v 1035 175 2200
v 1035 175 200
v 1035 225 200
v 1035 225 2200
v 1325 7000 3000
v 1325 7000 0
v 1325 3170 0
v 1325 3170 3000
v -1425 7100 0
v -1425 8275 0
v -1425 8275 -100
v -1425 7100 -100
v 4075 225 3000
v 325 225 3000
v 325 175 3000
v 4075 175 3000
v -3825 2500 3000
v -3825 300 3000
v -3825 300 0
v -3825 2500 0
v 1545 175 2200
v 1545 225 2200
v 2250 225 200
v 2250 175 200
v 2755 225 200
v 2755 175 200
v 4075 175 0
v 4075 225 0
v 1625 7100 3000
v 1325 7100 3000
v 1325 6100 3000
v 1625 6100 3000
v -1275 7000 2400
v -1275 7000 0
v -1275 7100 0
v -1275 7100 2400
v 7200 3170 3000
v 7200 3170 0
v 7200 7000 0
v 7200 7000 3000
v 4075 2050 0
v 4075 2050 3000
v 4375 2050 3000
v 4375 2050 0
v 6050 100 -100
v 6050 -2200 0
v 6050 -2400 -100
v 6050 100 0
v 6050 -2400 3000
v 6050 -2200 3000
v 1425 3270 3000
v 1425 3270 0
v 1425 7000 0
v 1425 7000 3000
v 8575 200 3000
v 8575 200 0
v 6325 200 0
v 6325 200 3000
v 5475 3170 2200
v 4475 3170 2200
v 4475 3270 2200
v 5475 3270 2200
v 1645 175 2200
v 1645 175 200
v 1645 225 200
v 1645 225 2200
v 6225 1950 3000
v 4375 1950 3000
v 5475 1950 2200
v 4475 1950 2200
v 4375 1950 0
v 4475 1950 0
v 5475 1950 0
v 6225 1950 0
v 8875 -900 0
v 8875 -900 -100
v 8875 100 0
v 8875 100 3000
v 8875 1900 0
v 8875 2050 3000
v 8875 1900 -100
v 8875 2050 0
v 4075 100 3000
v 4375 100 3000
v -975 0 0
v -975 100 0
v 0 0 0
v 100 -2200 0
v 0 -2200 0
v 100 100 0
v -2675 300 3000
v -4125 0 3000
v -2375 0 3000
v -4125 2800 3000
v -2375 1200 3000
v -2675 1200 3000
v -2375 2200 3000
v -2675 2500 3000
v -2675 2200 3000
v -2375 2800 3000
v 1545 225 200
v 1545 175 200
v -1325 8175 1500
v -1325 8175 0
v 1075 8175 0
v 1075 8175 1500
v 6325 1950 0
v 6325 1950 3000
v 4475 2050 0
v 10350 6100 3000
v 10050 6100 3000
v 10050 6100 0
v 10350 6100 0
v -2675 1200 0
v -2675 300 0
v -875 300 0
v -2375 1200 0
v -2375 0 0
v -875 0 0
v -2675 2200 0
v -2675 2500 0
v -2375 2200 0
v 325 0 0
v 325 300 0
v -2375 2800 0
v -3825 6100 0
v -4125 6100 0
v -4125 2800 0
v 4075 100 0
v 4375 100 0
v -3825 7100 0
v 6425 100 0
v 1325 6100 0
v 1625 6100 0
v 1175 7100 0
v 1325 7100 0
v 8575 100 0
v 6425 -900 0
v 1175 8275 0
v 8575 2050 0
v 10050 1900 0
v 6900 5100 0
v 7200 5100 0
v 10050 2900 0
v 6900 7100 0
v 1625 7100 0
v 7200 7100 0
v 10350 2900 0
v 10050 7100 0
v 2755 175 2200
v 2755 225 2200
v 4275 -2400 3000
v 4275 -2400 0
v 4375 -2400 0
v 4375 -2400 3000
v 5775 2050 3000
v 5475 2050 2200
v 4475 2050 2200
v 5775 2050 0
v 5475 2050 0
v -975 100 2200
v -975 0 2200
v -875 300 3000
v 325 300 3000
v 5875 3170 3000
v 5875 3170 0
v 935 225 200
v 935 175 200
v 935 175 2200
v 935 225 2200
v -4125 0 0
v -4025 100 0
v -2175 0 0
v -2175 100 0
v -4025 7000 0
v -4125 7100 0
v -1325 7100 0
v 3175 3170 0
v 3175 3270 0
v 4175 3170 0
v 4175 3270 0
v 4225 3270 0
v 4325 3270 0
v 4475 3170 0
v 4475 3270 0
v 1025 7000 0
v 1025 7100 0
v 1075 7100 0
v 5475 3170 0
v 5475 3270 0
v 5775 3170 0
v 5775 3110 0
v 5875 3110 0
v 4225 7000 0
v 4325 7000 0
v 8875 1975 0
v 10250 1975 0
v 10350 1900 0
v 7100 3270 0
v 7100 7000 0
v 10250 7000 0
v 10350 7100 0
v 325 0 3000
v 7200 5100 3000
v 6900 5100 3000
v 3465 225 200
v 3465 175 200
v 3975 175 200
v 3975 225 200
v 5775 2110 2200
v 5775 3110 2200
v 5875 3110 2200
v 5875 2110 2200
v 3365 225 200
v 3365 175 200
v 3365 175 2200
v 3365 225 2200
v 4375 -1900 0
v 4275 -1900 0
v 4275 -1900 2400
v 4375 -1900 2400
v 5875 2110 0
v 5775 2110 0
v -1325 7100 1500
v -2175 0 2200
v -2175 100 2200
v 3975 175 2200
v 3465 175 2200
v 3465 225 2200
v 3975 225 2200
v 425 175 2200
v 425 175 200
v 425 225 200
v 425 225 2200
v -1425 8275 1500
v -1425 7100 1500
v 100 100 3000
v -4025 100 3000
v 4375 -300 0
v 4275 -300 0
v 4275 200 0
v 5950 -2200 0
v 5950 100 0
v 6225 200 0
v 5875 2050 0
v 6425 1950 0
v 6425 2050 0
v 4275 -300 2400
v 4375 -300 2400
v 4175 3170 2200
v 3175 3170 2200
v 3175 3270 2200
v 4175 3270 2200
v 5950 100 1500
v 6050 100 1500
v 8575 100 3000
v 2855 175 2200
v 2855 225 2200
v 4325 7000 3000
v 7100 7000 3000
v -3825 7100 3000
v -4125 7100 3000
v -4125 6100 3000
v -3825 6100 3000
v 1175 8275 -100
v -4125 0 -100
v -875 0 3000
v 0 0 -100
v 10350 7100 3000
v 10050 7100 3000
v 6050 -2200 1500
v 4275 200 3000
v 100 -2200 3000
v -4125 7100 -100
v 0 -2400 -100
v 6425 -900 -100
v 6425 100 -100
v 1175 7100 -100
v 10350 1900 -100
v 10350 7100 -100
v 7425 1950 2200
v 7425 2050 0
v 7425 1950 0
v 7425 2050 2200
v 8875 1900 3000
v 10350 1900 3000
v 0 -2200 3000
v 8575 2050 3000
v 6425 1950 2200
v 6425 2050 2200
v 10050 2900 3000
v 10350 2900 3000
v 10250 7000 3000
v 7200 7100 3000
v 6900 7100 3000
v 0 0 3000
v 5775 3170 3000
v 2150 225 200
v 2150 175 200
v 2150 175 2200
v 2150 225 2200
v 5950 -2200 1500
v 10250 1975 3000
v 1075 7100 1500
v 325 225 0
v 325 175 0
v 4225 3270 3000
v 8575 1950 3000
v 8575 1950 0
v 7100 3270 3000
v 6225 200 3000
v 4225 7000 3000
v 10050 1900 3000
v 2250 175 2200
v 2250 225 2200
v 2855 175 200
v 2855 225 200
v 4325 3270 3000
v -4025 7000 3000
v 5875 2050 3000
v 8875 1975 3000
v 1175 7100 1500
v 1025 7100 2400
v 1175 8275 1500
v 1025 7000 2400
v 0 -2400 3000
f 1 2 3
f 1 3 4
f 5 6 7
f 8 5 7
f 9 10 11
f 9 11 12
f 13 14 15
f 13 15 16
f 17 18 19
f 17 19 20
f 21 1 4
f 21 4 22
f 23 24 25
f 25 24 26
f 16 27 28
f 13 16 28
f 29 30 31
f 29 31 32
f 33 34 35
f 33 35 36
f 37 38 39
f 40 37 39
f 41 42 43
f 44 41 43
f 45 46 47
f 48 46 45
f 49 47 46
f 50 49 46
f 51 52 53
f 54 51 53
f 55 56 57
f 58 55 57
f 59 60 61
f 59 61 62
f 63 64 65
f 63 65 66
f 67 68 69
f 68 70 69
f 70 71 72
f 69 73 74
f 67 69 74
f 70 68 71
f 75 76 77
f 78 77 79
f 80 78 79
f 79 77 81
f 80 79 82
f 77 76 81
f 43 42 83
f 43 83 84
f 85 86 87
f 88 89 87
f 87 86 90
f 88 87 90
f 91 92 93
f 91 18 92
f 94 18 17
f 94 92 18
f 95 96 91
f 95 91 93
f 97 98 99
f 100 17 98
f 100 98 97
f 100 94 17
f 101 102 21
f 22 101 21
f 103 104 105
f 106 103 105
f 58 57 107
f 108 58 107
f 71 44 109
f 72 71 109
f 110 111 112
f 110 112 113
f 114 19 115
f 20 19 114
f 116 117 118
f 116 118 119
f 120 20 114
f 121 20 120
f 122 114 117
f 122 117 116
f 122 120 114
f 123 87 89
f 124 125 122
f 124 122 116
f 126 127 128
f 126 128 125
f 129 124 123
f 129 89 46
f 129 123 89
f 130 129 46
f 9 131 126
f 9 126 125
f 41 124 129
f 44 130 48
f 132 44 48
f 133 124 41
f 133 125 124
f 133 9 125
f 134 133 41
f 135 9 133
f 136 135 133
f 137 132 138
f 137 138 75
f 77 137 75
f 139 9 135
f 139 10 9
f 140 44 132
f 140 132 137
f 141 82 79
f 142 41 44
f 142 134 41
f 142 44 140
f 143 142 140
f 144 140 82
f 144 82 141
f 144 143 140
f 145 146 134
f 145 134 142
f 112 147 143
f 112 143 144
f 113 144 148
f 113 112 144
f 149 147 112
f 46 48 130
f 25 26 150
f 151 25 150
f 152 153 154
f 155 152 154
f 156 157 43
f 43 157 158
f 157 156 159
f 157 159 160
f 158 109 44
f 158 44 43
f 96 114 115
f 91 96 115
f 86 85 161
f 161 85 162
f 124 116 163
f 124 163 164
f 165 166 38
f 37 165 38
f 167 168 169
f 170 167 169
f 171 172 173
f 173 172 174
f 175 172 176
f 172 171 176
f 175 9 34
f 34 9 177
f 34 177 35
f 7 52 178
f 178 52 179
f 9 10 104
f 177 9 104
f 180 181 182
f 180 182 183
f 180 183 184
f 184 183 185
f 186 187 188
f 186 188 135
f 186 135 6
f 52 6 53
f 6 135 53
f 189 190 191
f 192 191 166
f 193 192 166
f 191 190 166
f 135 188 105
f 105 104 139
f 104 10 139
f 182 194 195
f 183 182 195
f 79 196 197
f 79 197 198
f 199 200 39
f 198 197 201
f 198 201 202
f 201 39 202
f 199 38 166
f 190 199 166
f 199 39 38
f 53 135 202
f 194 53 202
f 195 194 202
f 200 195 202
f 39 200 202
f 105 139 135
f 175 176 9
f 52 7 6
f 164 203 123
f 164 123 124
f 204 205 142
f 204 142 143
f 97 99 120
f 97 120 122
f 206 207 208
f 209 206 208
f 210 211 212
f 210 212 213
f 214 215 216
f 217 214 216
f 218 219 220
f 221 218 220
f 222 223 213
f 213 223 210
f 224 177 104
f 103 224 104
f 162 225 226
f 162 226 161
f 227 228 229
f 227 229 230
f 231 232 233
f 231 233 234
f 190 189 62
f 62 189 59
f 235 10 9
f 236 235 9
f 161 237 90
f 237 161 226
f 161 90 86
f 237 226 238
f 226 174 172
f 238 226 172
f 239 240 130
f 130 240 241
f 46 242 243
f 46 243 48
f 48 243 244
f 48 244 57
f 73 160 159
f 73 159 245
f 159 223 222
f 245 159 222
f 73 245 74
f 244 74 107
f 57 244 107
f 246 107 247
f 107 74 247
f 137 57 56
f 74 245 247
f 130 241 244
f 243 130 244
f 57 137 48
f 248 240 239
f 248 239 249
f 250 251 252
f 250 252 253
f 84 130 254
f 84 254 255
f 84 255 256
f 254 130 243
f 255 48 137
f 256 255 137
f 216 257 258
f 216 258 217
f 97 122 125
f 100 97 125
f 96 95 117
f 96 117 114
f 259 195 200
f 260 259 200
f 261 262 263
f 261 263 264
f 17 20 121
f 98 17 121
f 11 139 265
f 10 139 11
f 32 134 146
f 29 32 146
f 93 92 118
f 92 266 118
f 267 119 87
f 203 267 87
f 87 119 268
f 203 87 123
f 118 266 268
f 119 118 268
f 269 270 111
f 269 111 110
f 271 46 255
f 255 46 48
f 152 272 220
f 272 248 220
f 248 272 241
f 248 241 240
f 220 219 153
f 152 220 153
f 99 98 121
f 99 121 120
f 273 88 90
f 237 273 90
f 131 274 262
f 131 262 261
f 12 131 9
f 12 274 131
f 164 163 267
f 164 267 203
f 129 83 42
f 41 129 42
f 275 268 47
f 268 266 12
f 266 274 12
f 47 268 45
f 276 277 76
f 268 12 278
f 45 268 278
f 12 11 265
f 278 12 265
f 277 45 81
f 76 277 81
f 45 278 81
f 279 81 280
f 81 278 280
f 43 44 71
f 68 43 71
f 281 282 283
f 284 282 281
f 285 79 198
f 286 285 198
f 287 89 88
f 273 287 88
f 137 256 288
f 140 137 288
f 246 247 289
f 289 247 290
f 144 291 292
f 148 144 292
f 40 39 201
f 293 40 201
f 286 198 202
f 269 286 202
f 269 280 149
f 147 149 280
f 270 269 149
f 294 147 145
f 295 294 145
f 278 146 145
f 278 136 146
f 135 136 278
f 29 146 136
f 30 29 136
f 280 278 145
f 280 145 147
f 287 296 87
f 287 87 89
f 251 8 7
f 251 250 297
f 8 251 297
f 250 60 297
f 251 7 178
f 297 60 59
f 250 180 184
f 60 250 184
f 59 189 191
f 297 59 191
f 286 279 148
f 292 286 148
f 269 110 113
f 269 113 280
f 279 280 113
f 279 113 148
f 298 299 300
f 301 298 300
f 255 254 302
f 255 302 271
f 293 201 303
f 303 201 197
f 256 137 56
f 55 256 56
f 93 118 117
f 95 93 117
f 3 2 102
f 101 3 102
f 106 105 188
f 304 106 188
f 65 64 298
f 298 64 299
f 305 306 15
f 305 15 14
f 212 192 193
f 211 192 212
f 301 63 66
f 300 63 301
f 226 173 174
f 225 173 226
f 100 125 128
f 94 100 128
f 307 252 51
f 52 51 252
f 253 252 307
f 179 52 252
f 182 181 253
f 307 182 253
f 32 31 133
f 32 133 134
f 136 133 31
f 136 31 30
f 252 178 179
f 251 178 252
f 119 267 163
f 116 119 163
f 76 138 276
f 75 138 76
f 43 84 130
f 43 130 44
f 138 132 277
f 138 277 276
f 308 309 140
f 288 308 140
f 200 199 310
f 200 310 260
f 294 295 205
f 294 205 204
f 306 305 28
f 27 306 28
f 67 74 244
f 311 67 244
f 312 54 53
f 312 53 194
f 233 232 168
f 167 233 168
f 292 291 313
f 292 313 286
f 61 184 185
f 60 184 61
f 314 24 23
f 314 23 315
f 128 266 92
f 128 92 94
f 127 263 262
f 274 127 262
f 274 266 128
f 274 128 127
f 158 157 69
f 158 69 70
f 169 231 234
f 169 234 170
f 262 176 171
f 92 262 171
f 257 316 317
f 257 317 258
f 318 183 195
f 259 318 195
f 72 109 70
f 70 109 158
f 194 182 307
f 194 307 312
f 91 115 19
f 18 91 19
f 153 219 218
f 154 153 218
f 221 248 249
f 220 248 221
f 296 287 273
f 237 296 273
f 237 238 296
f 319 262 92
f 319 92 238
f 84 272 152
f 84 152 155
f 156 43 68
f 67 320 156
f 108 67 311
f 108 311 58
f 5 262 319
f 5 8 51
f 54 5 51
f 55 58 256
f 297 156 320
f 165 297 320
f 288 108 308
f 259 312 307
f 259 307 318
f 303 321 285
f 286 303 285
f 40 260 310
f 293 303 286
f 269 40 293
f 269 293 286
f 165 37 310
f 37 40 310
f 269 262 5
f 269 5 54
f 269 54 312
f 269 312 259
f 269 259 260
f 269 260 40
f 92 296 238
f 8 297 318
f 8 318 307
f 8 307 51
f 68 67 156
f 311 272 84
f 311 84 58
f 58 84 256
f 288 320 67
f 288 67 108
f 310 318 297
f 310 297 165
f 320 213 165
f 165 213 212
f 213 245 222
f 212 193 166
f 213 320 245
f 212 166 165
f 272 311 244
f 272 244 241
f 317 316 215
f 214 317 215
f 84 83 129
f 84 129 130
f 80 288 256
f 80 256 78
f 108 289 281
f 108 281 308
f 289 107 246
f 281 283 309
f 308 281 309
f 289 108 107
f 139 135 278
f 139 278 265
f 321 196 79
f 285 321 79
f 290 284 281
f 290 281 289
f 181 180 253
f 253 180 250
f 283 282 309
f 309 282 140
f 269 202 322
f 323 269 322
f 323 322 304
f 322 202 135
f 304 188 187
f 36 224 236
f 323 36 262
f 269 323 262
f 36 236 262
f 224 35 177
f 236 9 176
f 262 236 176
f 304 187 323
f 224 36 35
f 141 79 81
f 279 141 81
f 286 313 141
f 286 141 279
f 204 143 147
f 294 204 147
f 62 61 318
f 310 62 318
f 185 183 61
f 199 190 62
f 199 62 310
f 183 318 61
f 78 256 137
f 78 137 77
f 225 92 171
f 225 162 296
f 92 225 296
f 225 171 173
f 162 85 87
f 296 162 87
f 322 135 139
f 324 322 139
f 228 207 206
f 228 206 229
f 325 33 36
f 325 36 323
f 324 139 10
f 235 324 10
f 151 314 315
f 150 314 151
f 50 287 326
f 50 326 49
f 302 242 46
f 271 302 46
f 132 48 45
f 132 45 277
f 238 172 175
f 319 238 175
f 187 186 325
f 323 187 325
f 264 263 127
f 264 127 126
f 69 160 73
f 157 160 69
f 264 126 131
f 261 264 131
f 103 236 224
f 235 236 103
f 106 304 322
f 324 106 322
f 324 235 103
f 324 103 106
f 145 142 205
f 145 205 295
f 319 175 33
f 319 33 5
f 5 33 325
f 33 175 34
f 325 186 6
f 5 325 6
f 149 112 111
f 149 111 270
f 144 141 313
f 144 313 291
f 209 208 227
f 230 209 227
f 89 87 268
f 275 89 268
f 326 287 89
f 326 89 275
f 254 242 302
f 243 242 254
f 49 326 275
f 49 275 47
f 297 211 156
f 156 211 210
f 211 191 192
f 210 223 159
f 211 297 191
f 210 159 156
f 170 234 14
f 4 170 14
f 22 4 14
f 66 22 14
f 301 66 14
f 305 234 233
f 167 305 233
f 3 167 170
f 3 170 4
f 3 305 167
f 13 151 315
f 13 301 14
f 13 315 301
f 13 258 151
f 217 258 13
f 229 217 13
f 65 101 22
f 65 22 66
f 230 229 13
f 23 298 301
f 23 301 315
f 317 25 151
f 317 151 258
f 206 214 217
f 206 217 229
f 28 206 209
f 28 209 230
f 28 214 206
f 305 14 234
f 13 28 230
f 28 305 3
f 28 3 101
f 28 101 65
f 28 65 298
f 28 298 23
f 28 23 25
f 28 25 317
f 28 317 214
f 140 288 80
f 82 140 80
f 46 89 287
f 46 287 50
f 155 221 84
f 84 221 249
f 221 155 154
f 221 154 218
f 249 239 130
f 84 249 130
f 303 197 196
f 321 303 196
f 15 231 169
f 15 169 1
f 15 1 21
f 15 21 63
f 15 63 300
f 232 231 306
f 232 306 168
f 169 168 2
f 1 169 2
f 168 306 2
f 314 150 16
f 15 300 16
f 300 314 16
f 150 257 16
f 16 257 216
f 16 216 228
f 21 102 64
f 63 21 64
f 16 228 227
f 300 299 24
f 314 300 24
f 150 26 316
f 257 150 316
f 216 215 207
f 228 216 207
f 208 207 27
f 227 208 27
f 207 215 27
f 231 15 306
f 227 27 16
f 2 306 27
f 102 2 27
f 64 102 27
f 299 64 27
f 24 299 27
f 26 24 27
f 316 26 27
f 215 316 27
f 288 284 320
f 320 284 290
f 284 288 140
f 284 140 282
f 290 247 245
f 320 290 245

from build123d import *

# Parameters (mm, degrees)
F1_DEPTH  = 100
F3_DEPTH  = 3000
F4_W      = 300
F4_H      = 1000
F4_H_2    = 2000
F4_H_3    = 1950
F4_W_2    = 1200
F4_H_4    = 300
F4_W_3    = 6050
F4_H_5    = 200
F5_DEPTH  = 3000
F6_W      = 2750
F6_H      = 100
F7_DEPTH  = 3000
F8_W      = 2800
F8_H      = 3730
F8_W_2    = 2775
F9_DEPTH  = 3000
F10_W     = 1200
F10_H     = 2200
F11_DEPTH = 100
F12_W     = 1000
F12_H     = 2200
F13_DEPTH = 100
F14_W     = 1000
F14_H     = 2200
F15_DEPTH = 100
F16_W     = 1000
F16_H     = 2200
F17_DEPTH = 100
F18_W     = 1600
F18_H     = 2400
F19_DEPTH = 100
F20_W     = 2300
F20_H     = 2400
F21_DEPTH = 100
F22_W     = 100
F22_H     = 2300
F23_DEPTH = 1500
F24_W     = 3750
F24_H     = 50
F25_DEPTH = 3000
F26_W     = 510
F26_H     = 2000
F26_W_2   = 505
F27_DEPTH = 8100.001


with BuildPart() as f1:
    # F0 (on Top) → F1 (new body)
    with BuildSketch(Plane.XY):
        Polygon((-4125, 0), (0, 0), (0, -2400), (6050, -2400), (6050, -900), (6050, 0), (6050, 100), (6425, 100), (6425, 0), (6425, -900), (8875, -900), (8875, 1900), (10350, 1900), (10350, 7100), (1175, 7100), (1175, 8275), (-1425, 8275), (-1425, 7100), (-4125, 7100), align=None)
    extrude(amount=-F1_DEPTH)

    # F2 (on face) → F3 (join)
    with BuildSketch(Plane.XY):
        Polygon((-4125, 2800), (-4125, 0), (-2375, 0), (-2375, 1200), (-2675, 1200), (-2675, 300), (-3825, 300), (-3825, 2500), (-2675, 2500), (-2675, 2200), (-2375, 2200), (-2375, 2800), align=None)
    extrude(amount=F3_DEPTH)

    # F4 (on face) → F5 (join)
    with BuildSketch(Plane.XY):
        with Locations((-3975, 6600)):
            Rectangle(F4_W, F4_H)
        with Locations((1475, 6600)):
            Rectangle(F4_W, F4_H)
        with Locations((7050, 6100)):
            Rectangle(F4_W, F4_H_2)
        with Locations((10200, 6600)):
            Rectangle(F4_W, F4_H)
        with Locations((10200, 2400)):
            Rectangle(F4_W, F4_H)
        with Locations((8725, 1075)):
            Rectangle(F4_W, F4_H_3)
        with Locations((4225, 1075)):
            Rectangle(F4_W, F4_H_3)
        with Locations((-275, 150)):
            Rectangle(F4_W_2, F4_H_4)
        with Locations((3025, -2300)):
            Rectangle(F4_W_3, F4_H_5)
    extrude(amount=F5_DEPTH)


with BuildPart() as f7:
    # F6 (on face) → F7 (new body)
    with BuildSketch(Plane.XY):
        Polygon((0, 0), (0, -2200), (100, -2200), (100, 100), (-4025, 100), (-4025, 7000), (-1425, 7000), (-1425, 7100), (-4125, 7100), (-4125, 0), align=None)
        with Locations((-50, 7050)):
            Rectangle(F6_W, F6_H)
    extrude(amount=F7_DEPTH)

    # F8 (on face) → F9 (join)
    with BuildSketch(Plane.XY):
        Polygon((5875, 3170), (7200, 3170), (7200, 7000), (7200, 7100), (1325, 7100), (1325, 3170), (5775, 3170), (5775, 2050), (4375, 2050), (4375, 1950), (6225, 1950), (6225, 200), (4375, 200), (4375, 100), (8575, 100), (8575, 200), (6325, 200), (6325, 1950), (8575, 1950), (8575, 2050), (5875, 2050), align=None)
        with Locations((2825, 5135)):
            Rectangle(F8_W, F8_H, mode=Mode.SUBTRACT)
        with Locations((5712.5, 5135)):
            Rectangle(F8_W_2, F8_H, mode=Mode.SUBTRACT)
        Polygon((7200, 7100), (7200, 7000), (10250, 7000), (10250, 1975), (8875, 1975), (8875, 1900), (10250, 1900), (10350, 1900), (10350, 7000), (10350, 7100), (10250, 7100), align=None)
        Polygon((4375, -2400), (4375, 100), (4375, 200), (4275, 200), (4275, -2400), align=None)
    extrude(amount=F9_DEPTH)

    # F10 (on face) → F11 (cut)
    with BuildSketch(Plane.XZ):
        with Locations((-1575, 1100)):
            Rectangle(F10_W, F10_H)
    extrude(amount=-F11_DEPTH, mode=Mode.SUBTRACT)

    # F12 (on face) → F13 (cut)
    with BuildSketch(Plane.XZ.offset(-3170)):
        with Locations((3675, 1100)):
            Rectangle(F12_W, F12_H)
        with Locations((4975, 1100)):
            Rectangle(F12_W, F12_H)
    extrude(amount=-F13_DEPTH, mode=Mode.SUBTRACT)

    # F14 (on face) → F15 (cut)
    with BuildSketch(Plane(origin=(5775, 0, 0), x_dir=(0, -1, 0), z_dir=(-1, 0, 0))):
        with Locations((-2610, 1100)):
            Rectangle(F14_W, F14_H)
    extrude(amount=-F15_DEPTH, mode=Mode.SUBTRACT)

    # F16 (on face) → F17 (cut)
    with BuildSketch(Plane(origin=(0, 2050, 0), x_dir=(-1, 0, 0), z_dir=(0, 1, 0))):
        with Locations((-4975, 1100)):
            Rectangle(F16_W, F16_H)
        with Locations((-6925, 1100)):
            Rectangle(F16_W, F16_H)
    extrude(amount=-F17_DEPTH, mode=Mode.SUBTRACT)

    # F18 (on face) → F19 (cut)
    with BuildSketch(Plane(origin=(4275, 0, 0), x_dir=(0, -1, 0), z_dir=(-1, 0, 0))):
        with Locations((1100, 1200)):
            Rectangle(F18_W, F18_H)
    extrude(amount=-F19_DEPTH, mode=Mode.SUBTRACT)

    # F20 (on face) → F21 (cut)
    with BuildSketch(Plane.XZ.offset(-7000)):
        with Locations((-125, 1200)):
            Rectangle(F20_W, F20_H)
    extrude(amount=-F21_DEPTH, mode=Mode.SUBTRACT)

    # F22 (on face) → F23 (join)
    with BuildSketch(Plane.XY):
        Polygon((-1425, 8275), (-1425, 7100), (-1325, 7100), (-1325, 8175), (1075, 8175), (1075, 7100), (1175, 7100), (1175, 8275), align=None)
        with Locations((6000, -1050)):
            Rectangle(F22_W, F22_H)
    extrude(amount=F23_DEPTH)


with BuildPart() as f25:
    # F24 (on face) → F25 (new body)
    with BuildSketch(Plane.XY):
        with Locations((2200, 200)):
            Rectangle(F24_W, F24_H)
    extrude(amount=F25_DEPTH)

    # F26 (on face) → F27 (cut, through all)
    with BuildSketch(Plane.XZ.offset(-175)):
        with Locations((680, 1200)):
            Rectangle(F26_W, F26_H)
        with Locations((1290, 1200)):
            Rectangle(F26_W, F26_H)
        with Locations((1897.5, 1200)):
            Rectangle(F26_W_2, F26_H)
        with Locations((3720, 1200)):
            Rectangle(F26_W, F26_H)
        with Locations((2502.5, 1200)):
            Rectangle(F26_W_2, F26_H)
        with Locations((3110, 1200)):
            Rectangle(F26_W, F26_H)
    extrude(amount=-F27_DEPTH, mode=Mode.SUBTRACT)


solid = Compound([f1.part, f7.part, f25.part])
